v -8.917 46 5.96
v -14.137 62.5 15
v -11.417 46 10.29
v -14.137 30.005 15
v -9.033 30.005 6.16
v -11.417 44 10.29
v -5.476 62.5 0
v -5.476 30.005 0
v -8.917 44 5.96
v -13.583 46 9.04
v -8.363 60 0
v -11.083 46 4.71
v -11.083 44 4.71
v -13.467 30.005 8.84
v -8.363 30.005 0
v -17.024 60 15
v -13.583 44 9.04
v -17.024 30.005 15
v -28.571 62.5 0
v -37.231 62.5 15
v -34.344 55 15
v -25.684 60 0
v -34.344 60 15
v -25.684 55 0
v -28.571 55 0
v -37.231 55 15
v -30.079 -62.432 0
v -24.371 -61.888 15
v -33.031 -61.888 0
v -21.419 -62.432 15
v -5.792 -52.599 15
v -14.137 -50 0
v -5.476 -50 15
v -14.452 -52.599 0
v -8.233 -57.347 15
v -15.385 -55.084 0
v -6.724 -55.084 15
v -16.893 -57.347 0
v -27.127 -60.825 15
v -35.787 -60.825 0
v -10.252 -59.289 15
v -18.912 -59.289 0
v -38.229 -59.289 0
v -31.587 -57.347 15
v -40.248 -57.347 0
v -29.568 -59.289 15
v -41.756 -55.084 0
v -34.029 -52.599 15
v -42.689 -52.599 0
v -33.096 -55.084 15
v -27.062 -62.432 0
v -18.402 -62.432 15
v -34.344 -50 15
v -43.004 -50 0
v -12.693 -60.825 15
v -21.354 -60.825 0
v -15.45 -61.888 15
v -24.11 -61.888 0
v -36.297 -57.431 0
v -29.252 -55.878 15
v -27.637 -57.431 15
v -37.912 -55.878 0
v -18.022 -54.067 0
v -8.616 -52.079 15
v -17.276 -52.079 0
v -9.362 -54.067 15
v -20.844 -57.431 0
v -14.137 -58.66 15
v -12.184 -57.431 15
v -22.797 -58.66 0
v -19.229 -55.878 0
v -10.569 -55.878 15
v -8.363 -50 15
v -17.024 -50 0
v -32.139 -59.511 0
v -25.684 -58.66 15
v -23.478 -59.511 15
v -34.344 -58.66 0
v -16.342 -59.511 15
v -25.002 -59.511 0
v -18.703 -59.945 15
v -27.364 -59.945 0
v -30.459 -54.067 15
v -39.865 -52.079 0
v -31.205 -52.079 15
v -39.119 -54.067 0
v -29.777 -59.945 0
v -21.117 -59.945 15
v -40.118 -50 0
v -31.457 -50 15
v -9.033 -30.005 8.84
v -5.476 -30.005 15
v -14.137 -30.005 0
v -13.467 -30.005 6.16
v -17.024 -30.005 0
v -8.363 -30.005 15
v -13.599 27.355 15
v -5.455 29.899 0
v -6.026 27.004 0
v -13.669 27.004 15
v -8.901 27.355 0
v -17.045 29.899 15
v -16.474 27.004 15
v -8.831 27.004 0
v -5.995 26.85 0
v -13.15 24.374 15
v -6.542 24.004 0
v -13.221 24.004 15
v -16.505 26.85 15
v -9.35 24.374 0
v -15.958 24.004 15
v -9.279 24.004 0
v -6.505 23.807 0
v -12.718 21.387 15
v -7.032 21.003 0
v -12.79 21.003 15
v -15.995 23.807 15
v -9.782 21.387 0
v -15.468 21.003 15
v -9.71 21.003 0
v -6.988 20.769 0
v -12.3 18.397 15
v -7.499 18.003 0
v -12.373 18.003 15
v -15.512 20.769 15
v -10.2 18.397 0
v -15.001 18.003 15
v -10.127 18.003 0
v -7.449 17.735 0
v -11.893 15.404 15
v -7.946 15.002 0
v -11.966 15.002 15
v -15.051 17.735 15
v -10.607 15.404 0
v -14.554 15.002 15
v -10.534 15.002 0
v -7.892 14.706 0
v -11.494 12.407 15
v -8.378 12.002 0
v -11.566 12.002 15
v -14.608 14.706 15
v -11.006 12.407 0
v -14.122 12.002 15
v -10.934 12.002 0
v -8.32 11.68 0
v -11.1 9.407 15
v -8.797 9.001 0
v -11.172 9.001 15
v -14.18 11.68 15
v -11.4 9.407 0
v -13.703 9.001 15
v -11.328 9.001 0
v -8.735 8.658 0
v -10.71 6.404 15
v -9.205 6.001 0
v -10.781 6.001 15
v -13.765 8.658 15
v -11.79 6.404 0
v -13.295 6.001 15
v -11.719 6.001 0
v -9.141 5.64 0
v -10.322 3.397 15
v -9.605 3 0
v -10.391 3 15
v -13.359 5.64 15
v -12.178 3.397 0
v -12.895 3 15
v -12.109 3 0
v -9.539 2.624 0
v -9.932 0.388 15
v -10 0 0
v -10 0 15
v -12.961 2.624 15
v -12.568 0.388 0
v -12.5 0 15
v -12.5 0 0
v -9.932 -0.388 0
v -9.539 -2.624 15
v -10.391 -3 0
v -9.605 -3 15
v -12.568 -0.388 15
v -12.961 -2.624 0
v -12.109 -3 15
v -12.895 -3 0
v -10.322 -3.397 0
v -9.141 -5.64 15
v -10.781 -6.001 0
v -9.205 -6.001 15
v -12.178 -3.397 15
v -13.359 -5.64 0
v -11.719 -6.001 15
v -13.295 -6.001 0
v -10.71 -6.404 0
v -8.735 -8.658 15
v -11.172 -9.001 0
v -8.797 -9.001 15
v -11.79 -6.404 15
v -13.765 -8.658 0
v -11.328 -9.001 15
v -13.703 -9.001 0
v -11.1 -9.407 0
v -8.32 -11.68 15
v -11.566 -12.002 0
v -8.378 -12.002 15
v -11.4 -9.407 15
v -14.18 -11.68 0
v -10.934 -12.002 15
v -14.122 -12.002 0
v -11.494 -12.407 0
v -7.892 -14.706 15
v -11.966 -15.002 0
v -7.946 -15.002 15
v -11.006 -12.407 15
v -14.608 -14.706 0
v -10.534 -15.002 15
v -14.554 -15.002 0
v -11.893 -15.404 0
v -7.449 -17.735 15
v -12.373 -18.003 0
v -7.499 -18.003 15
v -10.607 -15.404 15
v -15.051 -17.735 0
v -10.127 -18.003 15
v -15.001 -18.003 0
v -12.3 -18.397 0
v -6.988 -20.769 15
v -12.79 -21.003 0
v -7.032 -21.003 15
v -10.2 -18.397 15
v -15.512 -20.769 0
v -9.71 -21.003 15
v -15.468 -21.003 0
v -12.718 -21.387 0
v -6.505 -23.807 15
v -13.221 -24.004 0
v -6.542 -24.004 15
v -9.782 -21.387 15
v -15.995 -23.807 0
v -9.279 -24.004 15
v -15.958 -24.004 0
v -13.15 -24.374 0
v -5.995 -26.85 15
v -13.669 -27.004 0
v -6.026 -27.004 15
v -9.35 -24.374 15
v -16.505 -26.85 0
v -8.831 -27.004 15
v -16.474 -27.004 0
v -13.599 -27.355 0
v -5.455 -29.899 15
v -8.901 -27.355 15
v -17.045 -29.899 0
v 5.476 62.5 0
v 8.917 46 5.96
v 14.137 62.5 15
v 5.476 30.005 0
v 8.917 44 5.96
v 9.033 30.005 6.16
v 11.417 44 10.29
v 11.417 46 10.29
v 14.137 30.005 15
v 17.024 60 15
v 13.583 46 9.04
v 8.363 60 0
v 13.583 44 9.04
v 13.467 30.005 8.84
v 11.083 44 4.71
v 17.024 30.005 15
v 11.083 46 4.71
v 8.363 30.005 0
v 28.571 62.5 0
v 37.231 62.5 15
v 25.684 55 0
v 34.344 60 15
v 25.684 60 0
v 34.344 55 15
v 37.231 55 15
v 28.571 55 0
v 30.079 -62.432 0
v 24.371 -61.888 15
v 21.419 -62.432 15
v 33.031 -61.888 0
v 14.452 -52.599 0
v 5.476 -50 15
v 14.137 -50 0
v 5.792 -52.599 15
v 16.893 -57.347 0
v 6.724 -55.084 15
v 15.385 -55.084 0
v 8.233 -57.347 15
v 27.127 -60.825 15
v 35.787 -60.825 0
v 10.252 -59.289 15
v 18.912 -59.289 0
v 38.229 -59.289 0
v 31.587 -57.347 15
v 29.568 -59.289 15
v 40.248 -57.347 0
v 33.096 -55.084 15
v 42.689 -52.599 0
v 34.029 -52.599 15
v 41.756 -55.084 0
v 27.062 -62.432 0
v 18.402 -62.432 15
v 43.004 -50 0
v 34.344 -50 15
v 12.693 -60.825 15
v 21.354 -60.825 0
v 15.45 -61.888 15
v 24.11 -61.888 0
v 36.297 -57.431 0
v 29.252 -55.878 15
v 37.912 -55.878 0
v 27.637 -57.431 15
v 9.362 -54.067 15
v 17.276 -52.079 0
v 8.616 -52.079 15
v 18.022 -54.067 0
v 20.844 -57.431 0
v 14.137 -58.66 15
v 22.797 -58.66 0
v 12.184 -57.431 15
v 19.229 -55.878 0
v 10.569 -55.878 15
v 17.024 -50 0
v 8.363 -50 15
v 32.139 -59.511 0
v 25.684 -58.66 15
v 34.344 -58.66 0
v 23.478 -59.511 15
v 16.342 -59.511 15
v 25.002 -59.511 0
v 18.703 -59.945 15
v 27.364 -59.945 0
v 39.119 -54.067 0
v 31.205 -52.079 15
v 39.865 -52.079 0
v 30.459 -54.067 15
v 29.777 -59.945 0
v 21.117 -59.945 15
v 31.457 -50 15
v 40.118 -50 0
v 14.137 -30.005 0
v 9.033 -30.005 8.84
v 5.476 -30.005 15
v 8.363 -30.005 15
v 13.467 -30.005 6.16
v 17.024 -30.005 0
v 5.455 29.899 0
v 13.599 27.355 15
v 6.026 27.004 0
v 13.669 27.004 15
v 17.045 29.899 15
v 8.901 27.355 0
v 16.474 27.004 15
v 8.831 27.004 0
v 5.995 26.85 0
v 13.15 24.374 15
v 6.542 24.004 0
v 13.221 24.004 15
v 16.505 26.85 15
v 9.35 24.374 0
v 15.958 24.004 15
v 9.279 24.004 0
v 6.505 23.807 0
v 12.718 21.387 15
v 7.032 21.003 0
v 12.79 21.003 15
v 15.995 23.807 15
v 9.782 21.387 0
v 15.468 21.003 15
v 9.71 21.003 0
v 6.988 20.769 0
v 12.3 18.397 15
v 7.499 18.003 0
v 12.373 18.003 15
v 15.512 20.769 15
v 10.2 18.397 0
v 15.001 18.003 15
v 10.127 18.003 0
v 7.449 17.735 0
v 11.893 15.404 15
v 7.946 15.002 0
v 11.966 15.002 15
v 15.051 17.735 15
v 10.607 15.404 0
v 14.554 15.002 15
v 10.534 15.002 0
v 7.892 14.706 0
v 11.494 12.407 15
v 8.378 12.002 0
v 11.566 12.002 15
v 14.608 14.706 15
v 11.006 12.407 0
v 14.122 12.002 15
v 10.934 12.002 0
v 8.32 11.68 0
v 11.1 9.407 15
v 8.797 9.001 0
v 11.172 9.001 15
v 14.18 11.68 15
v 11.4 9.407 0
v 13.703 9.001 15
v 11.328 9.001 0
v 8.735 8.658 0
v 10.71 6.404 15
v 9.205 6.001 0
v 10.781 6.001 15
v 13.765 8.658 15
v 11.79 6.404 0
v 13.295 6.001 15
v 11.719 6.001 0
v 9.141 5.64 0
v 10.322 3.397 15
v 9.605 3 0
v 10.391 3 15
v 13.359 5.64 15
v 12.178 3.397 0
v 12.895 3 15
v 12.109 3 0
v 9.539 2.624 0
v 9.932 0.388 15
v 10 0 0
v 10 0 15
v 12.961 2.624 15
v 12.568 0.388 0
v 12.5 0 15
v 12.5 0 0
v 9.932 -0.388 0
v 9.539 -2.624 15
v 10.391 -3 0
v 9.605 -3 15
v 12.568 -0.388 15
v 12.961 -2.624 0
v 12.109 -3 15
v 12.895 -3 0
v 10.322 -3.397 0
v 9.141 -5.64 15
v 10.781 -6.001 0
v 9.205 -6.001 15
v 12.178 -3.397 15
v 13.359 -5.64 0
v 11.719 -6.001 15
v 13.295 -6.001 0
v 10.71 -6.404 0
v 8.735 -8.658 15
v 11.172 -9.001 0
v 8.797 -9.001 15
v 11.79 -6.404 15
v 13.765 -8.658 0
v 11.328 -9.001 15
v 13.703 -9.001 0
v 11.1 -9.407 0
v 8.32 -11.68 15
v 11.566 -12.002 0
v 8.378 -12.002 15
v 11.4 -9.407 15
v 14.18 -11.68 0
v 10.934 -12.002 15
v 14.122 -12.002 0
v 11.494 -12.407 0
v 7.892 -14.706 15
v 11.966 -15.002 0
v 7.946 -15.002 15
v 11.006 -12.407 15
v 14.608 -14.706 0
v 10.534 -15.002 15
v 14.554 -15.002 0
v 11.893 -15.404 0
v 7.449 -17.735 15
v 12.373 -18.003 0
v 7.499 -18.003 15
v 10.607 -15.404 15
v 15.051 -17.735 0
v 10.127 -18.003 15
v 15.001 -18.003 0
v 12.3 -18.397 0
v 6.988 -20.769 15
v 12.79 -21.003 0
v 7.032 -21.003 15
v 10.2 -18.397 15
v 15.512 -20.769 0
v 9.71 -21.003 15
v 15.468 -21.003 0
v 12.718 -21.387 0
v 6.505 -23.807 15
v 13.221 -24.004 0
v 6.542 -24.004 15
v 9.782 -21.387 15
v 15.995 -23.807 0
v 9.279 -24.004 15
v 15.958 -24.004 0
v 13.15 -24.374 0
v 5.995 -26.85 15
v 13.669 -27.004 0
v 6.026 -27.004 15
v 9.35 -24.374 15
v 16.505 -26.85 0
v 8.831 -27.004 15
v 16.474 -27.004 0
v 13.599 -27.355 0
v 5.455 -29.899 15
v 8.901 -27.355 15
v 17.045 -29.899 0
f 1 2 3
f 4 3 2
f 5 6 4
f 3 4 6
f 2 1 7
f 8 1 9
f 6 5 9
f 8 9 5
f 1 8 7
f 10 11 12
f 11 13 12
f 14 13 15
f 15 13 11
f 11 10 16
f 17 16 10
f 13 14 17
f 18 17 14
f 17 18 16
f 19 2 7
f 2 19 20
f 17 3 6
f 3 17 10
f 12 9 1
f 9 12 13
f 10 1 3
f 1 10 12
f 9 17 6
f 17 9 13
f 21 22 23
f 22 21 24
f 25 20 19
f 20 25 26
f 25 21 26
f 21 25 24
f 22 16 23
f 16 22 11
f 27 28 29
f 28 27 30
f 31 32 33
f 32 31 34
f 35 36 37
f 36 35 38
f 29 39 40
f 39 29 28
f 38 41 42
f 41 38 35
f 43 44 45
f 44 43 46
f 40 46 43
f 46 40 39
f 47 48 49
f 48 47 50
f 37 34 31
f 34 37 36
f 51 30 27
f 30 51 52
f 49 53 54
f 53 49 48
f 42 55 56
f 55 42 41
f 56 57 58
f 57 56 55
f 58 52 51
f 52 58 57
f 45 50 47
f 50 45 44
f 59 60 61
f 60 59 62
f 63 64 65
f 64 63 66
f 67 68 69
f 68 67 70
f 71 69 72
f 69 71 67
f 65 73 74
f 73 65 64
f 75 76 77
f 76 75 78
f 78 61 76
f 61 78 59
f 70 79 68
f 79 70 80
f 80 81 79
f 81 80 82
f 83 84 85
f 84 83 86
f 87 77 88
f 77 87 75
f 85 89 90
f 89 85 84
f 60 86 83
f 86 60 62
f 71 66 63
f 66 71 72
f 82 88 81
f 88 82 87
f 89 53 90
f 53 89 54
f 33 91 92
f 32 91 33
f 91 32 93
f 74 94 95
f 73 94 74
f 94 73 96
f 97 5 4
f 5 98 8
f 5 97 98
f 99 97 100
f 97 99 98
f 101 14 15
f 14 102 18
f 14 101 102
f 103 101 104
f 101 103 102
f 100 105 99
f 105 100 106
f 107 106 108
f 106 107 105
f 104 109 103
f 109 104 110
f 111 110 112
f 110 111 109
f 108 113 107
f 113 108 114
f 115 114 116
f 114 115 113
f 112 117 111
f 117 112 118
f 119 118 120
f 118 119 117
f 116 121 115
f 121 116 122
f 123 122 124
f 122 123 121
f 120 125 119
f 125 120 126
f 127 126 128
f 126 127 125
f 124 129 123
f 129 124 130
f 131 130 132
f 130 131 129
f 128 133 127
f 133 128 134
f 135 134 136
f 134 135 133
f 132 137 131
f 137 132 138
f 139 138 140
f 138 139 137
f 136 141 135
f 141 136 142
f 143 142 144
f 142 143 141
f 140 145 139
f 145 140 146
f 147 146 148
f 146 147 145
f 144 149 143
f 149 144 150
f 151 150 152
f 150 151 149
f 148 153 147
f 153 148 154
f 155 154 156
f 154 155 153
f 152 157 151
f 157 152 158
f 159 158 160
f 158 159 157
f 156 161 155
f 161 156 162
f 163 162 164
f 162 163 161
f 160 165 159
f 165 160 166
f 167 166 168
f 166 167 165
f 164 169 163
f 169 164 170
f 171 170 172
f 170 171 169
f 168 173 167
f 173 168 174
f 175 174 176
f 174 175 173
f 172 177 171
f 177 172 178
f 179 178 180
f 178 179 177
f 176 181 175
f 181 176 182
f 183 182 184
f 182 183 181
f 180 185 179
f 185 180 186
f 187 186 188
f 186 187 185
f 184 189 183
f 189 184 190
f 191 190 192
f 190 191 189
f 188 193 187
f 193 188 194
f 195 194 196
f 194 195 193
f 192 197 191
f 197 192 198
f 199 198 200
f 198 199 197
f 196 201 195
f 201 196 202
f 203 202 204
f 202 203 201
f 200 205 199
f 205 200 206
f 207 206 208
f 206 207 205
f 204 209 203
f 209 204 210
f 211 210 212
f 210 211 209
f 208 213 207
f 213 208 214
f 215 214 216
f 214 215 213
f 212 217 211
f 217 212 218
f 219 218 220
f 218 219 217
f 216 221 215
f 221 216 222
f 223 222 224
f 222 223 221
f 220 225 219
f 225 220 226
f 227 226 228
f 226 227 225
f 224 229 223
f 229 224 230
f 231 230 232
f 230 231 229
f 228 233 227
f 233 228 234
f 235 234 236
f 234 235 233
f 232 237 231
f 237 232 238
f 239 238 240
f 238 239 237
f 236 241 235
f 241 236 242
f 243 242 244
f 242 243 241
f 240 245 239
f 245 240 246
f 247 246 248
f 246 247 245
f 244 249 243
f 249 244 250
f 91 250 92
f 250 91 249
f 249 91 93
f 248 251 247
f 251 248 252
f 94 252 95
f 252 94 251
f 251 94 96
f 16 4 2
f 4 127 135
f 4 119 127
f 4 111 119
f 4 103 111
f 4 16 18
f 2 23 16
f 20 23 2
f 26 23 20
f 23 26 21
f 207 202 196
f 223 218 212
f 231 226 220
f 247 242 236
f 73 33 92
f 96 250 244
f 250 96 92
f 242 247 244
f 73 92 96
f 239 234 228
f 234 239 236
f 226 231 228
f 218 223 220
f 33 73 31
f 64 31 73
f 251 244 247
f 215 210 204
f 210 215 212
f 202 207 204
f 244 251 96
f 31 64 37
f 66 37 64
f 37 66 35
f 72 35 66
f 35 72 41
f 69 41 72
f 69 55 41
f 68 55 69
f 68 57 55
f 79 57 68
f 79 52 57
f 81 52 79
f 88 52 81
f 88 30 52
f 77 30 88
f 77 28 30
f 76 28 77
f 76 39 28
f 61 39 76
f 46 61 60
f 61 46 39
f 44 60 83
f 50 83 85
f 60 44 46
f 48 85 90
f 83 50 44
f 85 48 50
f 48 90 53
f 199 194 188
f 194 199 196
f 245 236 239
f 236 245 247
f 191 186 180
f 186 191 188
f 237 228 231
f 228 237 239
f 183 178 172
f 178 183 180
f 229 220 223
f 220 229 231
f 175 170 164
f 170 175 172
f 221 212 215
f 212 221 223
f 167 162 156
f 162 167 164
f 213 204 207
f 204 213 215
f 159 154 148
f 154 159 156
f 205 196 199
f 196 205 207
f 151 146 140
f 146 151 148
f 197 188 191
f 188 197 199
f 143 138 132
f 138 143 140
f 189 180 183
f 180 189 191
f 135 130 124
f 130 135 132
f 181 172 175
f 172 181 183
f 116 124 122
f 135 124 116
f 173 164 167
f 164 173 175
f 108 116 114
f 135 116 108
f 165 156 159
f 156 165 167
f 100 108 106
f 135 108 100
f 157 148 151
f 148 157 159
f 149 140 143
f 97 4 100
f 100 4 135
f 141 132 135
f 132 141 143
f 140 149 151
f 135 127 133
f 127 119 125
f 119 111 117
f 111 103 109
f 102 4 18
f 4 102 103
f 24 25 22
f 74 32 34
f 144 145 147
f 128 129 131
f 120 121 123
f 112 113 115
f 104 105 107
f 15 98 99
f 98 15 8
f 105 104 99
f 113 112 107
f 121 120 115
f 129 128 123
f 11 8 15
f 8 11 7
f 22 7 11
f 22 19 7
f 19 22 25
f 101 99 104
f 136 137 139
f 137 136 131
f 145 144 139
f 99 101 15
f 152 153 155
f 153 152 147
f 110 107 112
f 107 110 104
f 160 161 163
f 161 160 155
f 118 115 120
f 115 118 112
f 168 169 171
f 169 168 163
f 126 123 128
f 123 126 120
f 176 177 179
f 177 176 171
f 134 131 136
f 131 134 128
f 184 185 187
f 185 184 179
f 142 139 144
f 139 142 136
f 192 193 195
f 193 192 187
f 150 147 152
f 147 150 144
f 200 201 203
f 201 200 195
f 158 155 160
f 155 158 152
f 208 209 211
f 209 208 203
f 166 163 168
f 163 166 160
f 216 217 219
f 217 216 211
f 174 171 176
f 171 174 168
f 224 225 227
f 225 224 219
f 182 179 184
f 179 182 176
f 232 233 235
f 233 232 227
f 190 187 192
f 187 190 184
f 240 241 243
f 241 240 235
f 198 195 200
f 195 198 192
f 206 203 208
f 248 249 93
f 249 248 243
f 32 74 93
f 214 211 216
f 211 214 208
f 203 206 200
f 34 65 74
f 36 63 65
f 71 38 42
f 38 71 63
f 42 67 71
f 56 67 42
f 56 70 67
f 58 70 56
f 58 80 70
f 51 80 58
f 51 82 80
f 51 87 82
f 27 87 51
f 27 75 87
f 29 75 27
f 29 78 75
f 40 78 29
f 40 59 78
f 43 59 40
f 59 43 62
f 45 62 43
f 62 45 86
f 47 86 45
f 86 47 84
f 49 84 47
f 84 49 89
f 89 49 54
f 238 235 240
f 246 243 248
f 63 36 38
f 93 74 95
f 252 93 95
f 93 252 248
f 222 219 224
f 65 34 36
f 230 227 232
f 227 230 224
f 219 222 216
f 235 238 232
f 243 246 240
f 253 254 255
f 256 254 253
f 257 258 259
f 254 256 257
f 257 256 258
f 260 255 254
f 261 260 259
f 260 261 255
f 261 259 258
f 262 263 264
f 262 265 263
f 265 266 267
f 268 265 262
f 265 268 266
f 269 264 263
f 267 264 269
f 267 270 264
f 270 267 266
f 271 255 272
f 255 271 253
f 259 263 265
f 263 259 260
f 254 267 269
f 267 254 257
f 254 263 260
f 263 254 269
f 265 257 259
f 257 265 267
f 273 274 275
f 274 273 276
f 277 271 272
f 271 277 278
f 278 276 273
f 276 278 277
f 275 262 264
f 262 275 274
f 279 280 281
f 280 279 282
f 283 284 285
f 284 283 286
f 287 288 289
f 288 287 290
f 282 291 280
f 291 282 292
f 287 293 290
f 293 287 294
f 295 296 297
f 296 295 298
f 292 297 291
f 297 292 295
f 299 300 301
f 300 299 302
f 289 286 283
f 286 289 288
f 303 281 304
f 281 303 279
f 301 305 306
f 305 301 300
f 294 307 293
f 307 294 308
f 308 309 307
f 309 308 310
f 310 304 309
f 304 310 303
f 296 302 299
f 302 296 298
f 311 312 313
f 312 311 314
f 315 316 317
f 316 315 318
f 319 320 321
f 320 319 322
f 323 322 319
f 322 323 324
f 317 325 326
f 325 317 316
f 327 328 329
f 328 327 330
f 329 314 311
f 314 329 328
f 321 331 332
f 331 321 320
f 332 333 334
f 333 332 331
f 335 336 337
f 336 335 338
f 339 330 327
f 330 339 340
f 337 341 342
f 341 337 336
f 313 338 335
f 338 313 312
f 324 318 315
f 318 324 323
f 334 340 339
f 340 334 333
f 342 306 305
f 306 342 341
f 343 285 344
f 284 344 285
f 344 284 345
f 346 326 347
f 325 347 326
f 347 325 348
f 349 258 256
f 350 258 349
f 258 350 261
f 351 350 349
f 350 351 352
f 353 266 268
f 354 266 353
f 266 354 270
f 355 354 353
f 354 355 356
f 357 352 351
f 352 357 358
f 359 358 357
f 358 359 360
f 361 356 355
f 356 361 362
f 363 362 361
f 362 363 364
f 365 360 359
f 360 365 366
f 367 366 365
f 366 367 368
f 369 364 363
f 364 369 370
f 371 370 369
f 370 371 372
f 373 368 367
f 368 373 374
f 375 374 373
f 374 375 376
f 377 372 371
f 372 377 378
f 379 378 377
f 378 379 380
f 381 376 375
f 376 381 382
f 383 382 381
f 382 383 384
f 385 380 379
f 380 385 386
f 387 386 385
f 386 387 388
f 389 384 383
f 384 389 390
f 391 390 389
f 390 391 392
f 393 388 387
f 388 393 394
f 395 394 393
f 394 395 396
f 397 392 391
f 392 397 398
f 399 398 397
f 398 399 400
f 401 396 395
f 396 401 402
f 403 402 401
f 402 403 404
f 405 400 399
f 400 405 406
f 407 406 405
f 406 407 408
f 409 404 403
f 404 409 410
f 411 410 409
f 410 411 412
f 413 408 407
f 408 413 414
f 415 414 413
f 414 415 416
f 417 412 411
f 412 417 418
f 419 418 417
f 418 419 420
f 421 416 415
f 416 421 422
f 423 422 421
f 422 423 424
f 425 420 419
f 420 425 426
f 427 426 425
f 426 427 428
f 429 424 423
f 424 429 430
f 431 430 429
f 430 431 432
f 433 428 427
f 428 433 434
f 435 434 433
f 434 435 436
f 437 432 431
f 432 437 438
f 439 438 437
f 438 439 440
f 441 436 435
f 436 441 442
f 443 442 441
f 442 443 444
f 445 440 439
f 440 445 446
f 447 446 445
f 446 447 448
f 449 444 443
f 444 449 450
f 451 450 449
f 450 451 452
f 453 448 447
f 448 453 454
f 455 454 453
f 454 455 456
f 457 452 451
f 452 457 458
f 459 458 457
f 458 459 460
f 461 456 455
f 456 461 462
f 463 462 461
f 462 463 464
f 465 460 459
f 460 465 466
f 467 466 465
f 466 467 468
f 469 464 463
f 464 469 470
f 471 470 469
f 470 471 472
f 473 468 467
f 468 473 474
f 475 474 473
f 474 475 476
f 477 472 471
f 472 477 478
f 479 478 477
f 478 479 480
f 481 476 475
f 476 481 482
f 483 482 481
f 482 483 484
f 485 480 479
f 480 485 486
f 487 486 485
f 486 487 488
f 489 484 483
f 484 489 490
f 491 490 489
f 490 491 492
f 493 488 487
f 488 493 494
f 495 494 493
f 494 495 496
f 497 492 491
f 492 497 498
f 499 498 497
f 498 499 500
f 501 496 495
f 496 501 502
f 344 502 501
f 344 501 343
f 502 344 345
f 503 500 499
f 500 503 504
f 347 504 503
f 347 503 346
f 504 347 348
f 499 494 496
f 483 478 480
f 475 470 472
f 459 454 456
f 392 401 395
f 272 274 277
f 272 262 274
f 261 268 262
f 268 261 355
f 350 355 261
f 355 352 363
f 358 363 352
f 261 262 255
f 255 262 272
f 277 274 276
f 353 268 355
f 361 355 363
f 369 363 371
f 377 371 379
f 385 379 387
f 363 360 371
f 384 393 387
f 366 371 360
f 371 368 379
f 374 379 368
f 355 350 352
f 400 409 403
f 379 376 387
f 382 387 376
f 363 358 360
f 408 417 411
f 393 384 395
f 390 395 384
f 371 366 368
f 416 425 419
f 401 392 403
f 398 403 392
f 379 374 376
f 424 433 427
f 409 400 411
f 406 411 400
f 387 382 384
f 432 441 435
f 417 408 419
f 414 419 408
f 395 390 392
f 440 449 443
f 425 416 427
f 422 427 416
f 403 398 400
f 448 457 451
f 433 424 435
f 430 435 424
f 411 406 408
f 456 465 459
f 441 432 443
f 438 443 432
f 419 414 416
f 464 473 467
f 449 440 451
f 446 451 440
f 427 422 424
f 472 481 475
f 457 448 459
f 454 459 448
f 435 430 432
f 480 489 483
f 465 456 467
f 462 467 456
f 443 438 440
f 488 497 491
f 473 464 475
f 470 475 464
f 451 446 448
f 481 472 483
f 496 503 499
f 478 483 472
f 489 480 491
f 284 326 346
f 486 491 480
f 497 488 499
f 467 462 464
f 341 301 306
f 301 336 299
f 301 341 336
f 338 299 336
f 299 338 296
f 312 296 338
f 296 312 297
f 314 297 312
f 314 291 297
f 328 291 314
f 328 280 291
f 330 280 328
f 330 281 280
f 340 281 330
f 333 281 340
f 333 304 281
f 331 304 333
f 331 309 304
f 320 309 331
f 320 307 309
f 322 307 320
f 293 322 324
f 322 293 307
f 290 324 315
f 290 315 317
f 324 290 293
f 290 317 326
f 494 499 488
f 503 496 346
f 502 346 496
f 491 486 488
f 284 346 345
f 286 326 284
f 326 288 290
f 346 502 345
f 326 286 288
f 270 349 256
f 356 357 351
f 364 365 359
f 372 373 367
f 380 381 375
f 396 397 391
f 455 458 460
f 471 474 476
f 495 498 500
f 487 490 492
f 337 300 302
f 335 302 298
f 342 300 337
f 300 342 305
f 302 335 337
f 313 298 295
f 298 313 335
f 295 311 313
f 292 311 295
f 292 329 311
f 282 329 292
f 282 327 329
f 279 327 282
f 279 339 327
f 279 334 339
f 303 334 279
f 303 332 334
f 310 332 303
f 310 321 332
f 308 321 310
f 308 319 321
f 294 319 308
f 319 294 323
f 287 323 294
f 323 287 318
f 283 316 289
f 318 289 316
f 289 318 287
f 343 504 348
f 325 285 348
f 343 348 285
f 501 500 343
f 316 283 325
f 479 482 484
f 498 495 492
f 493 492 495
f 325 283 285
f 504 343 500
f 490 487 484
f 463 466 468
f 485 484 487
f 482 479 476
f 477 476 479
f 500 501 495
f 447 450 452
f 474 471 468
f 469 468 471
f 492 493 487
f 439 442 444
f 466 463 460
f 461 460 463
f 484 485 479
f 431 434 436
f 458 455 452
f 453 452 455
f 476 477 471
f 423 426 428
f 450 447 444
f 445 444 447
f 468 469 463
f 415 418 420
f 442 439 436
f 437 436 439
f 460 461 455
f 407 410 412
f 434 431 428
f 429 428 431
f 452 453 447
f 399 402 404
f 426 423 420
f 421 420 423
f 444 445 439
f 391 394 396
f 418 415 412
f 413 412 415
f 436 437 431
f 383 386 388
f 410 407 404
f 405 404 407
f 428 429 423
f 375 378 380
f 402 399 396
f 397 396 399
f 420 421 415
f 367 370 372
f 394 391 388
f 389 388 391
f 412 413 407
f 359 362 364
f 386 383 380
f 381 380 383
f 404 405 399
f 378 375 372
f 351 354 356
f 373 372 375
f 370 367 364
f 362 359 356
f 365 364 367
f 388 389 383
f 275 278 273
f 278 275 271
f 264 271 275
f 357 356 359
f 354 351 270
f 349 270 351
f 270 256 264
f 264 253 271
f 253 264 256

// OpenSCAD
/* [Overall] */

// (mm)
Thickness = 2.5;

// at narrowest point (mm)
Width = 15;

// from top of bar to bottom of rod (mm)
Length = 120;

//(degrees)
TwistAngle = 60; // [0:90]

PartToMake = "both";	// [both,left only,right only]

/* [Bar End] */

// (mm)
BarWidth = 15;

// (mm)
BarHeight = 15;

// for cable tie, 0 to omit (mm)
SlotWidth = 5;

// (mm)
SlotThickness = 2;

/* [Rod End] */

// (mm)
RodDiameter = 20;

/* Derived values */
TwistWidth = 1000 * 2;
EndLength = max(BarHeight * 1.5, RodDiameter * 1.5);
TwistLength = Length - 2 * EndLength;

module BarEnd() {
	rotate([0, -TwistAngle/2, 0]) {
		translate([-BarWidth-Thickness*1.5, Length/2 - BarHeight/3, -TwistWidth/2])
			cube([Thickness, BarHeight/3 + Thickness, TwistWidth]);
		translate([-BarWidth-Thickness*1.5, Length/2, -TwistWidth/2])
			cube([BarWidth + Thickness * 2, Thickness, TwistWidth]);
		difference() {
			translate([-Thickness/2, TwistLength/2, -TwistWidth/2])
				cube([Thickness, EndLength + Thickness, TwistWidth]);
			translate([-Thickness, (Length - SlotThickness) / 2 - BarHeight, -SlotWidth/2])
				cube([Thickness * 2, SlotThickness, SlotWidth]);
		}
	}
}

module RodEnd() {
	rotate([0, TwistAngle/2, 0]) {
		translate([-(Thickness + RodDiameter)/2, -(Length - RodDiameter)/2, 0])
			difference() {
				cylinder(h=TwistWidth, center=true, r=RodDiameter/2 + Thickness);
				cylinder(h=TwistWidth, center=true, r=RodDiameter/2);
				translate([-RodDiameter, 0, -TwistWidth])
					cube([RodDiameter*2, RodDiameter, TwistWidth*2]);
			}
		translate([-Thickness/2, -(Length - RodDiameter)/2, -TwistWidth/2])
			cube([Thickness, EndLength - RodDiameter/2, TwistWidth]);
	}
}

module TwistyPart() {
	rotate([90, 0, 0])
		linear_extrude(height=TwistLength + 0.01, center=true, twist=TwistAngle, slices=20, convexity=10)
			rotate([0, 0, TwistAngle/2])
				square([Thickness, (Width + Thickness) / cos(TwistAngle/2)], center=true);
}

module Complete() {
	translate([0, 0, Width/2]) {
		intersection() {
			cube([1000, 1000, Width], center=true);
			union() {
				BarEnd();
				RodEnd();
				TwistyPart();
			}
		}
	}
}

shift = PartToMake != "both" ? 0 : sin(TwistAngle/2) * Width/2 + Thickness * 3;
if (PartToMake != "right only")
	translate([-shift, 0, 0])
		Complete();
if (PartToMake != "left only")
	translate([shift, 0, 0])
		mirror([1, 0, 0])
			Complete();
